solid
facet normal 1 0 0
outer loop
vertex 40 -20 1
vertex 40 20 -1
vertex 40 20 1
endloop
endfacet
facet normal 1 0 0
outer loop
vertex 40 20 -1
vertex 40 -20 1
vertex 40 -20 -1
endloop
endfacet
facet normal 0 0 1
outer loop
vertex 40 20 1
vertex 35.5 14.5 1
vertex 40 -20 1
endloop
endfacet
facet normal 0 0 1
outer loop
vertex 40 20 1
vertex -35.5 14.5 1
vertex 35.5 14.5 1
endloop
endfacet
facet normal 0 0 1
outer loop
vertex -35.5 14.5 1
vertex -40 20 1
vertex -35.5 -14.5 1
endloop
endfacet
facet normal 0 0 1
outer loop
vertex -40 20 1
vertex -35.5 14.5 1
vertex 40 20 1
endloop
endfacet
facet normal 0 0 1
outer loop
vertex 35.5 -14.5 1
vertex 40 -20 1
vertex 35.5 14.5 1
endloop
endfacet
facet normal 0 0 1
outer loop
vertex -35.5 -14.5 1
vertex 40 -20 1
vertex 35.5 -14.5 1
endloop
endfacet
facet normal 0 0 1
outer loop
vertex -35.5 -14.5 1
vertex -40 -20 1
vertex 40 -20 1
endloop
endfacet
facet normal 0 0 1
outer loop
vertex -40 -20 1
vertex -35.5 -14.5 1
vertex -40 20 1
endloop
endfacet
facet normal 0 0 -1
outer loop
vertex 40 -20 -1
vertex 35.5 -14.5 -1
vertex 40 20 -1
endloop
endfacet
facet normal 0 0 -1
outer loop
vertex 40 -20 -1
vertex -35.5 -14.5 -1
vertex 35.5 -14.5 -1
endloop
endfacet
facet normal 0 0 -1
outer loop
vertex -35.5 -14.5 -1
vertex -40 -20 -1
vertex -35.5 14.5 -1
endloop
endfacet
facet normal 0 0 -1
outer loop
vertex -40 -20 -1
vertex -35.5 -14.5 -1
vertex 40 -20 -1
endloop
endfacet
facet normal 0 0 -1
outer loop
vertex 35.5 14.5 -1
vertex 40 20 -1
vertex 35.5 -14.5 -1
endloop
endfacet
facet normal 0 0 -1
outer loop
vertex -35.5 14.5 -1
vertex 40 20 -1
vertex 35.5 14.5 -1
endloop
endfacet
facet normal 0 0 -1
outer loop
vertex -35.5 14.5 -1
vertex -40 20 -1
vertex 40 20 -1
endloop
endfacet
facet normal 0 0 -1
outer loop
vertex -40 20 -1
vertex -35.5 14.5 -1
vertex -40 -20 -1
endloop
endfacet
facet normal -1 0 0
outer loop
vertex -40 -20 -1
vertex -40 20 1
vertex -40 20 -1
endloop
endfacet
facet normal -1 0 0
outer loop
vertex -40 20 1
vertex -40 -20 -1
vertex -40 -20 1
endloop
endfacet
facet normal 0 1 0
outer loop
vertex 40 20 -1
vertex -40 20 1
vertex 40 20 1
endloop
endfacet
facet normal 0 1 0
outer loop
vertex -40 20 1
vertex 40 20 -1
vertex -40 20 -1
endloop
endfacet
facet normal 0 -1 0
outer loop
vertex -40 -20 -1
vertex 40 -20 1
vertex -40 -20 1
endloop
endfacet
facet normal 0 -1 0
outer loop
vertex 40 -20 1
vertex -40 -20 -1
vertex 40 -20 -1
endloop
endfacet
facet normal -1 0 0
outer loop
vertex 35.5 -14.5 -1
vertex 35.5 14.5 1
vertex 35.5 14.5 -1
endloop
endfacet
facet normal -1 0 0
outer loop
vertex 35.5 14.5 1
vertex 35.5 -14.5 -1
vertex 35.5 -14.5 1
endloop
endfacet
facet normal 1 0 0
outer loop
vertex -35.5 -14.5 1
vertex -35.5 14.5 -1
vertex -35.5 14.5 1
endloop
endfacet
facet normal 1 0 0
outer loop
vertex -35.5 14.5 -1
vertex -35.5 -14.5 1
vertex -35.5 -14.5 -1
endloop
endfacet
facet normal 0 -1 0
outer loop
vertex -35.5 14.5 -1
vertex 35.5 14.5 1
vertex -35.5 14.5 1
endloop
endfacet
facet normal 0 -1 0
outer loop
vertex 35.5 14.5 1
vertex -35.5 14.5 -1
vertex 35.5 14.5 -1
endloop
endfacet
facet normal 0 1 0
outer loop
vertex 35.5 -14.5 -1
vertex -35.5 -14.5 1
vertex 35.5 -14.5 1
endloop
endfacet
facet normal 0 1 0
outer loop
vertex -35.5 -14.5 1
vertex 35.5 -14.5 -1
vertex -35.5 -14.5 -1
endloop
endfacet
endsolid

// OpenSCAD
//Make this as functions so accessable outside of file
function frontplate_thickness()=2;



module frontplate(height=40,width=80)
{
    minheight=34;
    minwidth=75;
    thickness=frontplate_thickness();
    
    cutout_height=29;
    cutout_width=71;
    
    height=max(minheight,height);
    width=max(minwidth,width);
    
    echo("Frontplate Height:",height);
    echo("Frontplate Width:",width);
    
    difference()
    {
        cube([width,height,thickness],center=true);
        cube([cutout_width,cutout_height,thickness],center=true);
    }
}


frontplate();
